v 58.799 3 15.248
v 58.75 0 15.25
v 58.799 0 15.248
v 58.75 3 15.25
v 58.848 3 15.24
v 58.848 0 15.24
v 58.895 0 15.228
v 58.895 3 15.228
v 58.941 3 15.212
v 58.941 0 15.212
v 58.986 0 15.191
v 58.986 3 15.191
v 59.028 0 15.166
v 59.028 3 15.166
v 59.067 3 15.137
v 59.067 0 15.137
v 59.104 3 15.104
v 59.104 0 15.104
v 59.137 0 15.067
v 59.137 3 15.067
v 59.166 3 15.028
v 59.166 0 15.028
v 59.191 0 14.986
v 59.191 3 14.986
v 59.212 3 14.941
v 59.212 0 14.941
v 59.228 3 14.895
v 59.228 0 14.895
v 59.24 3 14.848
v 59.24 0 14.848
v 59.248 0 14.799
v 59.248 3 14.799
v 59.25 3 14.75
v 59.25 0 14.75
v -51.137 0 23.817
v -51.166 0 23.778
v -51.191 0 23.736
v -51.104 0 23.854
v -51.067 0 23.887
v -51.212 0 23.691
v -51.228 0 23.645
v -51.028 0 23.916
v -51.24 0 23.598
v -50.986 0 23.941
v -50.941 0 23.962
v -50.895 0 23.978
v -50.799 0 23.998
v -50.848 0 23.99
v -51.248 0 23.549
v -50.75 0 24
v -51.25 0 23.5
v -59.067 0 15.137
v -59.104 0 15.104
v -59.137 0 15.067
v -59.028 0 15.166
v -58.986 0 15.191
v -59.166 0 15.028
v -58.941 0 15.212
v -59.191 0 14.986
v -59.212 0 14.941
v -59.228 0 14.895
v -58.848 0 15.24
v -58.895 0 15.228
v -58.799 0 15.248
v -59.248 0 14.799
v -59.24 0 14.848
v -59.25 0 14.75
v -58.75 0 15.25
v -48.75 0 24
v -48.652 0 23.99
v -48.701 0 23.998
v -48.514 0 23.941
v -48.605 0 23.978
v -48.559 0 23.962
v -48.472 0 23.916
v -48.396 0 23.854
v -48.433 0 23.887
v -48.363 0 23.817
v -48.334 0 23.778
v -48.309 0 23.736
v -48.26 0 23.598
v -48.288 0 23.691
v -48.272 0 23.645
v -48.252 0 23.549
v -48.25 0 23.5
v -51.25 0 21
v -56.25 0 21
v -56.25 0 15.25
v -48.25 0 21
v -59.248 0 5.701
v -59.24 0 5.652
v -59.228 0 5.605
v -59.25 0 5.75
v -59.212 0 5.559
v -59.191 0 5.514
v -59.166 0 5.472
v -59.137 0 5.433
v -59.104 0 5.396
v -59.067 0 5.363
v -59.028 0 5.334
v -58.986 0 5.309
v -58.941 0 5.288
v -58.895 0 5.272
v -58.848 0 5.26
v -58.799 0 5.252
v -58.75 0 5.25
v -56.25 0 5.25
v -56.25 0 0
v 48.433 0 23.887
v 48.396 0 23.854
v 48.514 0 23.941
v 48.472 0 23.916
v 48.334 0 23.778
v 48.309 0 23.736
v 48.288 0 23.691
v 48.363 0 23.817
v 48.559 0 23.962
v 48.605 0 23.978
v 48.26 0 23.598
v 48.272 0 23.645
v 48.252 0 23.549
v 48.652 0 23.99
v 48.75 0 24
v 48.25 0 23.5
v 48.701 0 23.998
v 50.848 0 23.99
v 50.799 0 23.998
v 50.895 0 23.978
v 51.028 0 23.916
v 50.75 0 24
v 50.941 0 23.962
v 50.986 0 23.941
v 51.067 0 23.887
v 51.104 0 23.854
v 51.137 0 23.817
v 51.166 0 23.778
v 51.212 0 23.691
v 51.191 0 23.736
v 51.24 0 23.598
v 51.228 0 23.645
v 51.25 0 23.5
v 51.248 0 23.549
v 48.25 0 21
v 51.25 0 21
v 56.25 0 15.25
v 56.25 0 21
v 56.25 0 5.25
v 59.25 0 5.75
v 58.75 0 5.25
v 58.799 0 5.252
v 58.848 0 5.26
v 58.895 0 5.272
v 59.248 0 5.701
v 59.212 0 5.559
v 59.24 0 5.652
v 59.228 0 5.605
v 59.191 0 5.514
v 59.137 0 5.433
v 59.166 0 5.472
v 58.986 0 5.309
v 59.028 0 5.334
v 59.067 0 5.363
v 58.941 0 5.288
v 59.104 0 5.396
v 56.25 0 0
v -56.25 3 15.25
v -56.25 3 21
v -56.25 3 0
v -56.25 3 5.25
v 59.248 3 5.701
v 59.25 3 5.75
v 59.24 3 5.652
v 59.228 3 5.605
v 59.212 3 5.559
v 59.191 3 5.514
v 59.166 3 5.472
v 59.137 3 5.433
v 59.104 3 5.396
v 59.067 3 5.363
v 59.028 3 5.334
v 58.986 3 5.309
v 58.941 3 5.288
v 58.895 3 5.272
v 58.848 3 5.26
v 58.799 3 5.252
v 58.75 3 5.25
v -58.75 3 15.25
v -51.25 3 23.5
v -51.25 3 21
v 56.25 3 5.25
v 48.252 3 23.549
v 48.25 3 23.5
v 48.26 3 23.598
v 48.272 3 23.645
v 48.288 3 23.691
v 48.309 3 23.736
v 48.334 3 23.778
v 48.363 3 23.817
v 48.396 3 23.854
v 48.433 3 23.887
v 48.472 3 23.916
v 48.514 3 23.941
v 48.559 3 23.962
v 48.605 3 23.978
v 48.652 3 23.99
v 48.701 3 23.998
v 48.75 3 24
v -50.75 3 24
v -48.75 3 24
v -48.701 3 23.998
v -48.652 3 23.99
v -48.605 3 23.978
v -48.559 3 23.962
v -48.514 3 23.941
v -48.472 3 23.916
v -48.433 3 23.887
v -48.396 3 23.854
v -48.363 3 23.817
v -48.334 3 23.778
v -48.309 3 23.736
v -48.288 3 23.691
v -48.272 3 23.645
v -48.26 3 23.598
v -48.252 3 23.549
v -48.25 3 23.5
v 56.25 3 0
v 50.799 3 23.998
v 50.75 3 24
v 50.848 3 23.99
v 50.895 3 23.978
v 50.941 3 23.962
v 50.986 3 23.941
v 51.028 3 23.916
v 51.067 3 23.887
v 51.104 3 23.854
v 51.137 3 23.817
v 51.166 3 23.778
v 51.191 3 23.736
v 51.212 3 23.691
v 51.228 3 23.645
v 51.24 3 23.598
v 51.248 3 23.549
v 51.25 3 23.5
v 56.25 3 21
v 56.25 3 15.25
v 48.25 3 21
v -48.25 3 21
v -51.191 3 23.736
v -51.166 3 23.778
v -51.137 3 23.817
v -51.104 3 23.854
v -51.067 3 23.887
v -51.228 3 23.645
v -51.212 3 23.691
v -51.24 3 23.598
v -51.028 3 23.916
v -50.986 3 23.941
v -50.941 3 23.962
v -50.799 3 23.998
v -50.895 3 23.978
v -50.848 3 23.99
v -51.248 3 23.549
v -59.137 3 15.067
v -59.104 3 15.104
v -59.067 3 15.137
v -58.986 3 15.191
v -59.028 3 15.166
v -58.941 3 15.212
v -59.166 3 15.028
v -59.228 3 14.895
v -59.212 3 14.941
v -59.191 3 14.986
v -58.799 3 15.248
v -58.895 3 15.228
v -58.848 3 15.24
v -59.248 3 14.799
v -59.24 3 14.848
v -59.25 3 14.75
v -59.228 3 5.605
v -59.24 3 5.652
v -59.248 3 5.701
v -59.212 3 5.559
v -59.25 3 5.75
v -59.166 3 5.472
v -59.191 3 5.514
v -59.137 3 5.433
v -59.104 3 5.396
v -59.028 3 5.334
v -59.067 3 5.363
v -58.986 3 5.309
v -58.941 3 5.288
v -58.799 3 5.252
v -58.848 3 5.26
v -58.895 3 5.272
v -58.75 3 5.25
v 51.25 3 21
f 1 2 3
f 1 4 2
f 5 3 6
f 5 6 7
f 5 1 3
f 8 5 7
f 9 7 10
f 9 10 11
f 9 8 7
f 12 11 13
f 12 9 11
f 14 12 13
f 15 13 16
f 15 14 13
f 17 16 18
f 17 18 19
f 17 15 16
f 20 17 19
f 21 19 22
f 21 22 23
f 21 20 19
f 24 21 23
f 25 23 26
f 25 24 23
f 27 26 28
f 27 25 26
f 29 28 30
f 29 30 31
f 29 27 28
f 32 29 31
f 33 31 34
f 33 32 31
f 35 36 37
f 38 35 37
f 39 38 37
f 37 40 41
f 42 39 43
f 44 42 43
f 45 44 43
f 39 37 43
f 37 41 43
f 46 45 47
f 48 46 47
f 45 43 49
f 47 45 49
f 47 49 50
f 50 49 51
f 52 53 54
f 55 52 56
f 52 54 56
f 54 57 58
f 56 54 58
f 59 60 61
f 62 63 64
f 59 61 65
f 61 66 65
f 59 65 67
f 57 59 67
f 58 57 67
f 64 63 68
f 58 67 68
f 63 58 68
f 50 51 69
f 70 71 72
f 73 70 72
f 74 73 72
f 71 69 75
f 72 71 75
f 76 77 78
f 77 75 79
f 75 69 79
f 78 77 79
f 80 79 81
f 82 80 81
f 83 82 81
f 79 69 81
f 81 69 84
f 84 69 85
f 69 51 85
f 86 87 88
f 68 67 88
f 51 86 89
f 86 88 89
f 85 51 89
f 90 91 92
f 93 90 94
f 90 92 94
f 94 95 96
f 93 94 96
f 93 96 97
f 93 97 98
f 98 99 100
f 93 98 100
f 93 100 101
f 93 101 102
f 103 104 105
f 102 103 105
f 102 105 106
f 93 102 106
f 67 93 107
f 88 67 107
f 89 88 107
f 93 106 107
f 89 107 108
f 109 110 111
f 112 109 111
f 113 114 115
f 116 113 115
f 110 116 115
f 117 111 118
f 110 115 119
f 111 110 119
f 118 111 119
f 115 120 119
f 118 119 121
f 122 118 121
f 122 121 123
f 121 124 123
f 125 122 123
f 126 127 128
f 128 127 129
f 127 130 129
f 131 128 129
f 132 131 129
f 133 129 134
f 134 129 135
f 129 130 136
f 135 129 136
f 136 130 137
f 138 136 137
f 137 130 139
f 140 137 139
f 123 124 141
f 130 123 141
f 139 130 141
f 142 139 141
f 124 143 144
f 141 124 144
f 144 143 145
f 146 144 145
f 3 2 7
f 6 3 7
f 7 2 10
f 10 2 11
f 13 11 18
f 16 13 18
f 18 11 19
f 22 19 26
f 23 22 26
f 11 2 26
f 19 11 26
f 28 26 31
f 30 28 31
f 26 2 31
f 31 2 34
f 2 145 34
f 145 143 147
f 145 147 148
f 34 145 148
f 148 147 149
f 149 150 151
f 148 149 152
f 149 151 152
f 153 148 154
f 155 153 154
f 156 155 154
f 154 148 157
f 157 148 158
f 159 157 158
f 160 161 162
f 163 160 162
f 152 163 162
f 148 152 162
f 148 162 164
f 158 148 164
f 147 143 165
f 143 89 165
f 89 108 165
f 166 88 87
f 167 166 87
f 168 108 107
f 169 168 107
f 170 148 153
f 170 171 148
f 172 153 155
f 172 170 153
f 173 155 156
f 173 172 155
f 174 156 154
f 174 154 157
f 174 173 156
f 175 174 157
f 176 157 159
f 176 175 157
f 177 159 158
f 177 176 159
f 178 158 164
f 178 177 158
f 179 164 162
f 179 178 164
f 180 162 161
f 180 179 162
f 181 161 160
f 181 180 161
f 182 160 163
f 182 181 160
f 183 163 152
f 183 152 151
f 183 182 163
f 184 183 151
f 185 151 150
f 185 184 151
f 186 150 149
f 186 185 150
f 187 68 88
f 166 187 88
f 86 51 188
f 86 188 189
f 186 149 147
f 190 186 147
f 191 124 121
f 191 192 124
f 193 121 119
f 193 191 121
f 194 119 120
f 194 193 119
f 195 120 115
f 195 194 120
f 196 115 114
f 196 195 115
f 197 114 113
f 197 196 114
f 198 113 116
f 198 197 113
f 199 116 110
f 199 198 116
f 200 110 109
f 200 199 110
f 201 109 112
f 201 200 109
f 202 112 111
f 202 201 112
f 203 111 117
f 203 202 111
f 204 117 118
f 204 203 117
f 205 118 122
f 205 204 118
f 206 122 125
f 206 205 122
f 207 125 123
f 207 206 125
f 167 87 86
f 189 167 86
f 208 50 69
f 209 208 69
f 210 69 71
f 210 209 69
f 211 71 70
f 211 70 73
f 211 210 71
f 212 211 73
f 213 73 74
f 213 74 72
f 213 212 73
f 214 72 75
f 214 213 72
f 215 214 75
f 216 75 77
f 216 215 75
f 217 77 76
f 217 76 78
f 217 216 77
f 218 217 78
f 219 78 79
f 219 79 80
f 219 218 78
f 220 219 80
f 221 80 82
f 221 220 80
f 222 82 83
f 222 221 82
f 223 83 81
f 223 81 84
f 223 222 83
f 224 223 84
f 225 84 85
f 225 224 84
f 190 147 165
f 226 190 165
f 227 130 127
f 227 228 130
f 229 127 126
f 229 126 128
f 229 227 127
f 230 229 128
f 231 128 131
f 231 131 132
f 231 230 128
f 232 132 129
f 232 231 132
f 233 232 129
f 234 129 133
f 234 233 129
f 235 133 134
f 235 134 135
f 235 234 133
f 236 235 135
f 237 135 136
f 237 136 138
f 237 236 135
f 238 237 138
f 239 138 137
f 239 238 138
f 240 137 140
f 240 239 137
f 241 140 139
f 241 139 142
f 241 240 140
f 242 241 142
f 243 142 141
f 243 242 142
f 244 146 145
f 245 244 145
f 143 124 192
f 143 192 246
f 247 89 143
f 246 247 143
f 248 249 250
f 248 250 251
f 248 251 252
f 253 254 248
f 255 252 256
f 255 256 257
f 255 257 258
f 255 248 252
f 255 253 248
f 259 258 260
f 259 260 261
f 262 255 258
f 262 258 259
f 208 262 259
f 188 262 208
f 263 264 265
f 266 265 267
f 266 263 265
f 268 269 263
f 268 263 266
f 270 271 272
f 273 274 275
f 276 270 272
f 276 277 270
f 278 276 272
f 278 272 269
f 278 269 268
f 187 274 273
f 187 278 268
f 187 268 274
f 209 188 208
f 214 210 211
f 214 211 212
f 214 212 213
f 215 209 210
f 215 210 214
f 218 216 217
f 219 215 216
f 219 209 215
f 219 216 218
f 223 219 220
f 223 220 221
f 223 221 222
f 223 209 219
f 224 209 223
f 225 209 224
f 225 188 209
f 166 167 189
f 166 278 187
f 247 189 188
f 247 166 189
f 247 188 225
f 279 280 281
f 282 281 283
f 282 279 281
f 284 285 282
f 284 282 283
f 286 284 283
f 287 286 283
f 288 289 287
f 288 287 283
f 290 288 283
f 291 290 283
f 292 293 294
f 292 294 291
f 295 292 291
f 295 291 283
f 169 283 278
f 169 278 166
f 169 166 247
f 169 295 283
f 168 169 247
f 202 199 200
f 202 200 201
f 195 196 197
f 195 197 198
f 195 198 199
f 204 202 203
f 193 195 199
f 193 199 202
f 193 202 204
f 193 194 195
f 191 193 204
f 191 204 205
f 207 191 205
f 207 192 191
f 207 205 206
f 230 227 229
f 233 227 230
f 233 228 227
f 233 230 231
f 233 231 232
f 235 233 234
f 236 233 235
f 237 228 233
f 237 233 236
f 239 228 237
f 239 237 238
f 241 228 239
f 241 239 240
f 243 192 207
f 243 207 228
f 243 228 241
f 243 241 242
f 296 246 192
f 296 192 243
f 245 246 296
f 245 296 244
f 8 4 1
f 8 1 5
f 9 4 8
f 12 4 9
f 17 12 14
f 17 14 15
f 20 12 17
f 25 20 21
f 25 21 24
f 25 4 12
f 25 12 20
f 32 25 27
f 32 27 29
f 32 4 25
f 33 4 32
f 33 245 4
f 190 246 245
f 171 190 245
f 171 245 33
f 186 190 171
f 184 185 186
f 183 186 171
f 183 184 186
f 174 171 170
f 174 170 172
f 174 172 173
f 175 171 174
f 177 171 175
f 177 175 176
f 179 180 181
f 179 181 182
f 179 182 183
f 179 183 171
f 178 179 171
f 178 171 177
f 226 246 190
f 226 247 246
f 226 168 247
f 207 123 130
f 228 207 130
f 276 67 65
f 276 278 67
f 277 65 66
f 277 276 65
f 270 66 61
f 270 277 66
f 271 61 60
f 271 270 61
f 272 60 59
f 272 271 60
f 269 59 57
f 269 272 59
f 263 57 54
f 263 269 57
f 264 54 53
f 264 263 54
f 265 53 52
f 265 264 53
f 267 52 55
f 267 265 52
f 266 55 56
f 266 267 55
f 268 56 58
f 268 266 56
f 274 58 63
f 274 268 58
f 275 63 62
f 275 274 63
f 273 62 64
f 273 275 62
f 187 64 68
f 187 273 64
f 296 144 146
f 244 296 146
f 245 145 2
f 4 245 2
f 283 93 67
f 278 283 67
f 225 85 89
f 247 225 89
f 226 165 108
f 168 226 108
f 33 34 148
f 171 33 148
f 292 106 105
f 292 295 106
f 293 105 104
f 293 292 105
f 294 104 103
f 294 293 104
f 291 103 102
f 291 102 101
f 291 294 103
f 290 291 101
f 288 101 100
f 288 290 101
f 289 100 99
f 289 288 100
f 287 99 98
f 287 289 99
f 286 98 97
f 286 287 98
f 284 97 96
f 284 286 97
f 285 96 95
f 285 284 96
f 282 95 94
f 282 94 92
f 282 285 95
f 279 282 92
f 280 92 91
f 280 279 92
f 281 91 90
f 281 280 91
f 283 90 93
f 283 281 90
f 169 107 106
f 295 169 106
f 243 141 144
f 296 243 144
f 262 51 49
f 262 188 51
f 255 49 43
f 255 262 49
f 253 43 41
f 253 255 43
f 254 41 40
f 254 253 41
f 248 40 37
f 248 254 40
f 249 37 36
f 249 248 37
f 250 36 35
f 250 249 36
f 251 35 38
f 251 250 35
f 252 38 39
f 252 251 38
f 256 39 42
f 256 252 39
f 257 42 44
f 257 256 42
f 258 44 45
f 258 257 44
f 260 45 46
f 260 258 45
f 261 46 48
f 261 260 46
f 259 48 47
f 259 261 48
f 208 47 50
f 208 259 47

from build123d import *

# Parameters (mm, degrees)
SKETCH_1_W      = 3
SKETCH_1_H      = 3
EXTRUDE_1_DEPTH = 3
FILLET_1_R      = 0.5


with BuildPart() as part:
    # Эскиз1 → Бобышка-Вытянуть1 (new body)
    with BuildSketch(Plane(origin=(0, 0, 0), x_dir=(1, 0, 0), z_dir=(0, 1, 0))):
        Polygon((-56.25, -21), (56.25, -21), (56.25, -15.25), (59.25, -15.25), (59.25, -5.25), (56.25, -5.25), (56.25, 0), (-56.25, 0), (-56.25, -5.25), (-59.25, -5.25), (-59.25, -15.25), (-56.25, -15.25), align=None)
        with Locations((49.75, -22.5)):
            Rectangle(SKETCH_1_W, SKETCH_1_H)
        with Locations((-49.75, -22.5)):
            Rectangle(SKETCH_1_W, SKETCH_1_H)
    extrude(amount=EXTRUDE_1_DEPTH)

    # Скругление1
    fillet_1_edges = [part.edges().sort_by_distance(p)[0] for p in [
        (-59.25, 1.5, 15.25),
        (-59.25, 1.5, 5.25),
        (59.25, 1.5, 5.25),
        (59.25, 1.5, 15.25),
        (51.25, 1.5, 24),
        (48.25, 1.5, 24),
        (-48.25, 1.5, 24),
        (-51.25, 1.5, 24),
    ]]
    fillet(fillet_1_edges, radius=FILLET_1_R)


solid = part.part
